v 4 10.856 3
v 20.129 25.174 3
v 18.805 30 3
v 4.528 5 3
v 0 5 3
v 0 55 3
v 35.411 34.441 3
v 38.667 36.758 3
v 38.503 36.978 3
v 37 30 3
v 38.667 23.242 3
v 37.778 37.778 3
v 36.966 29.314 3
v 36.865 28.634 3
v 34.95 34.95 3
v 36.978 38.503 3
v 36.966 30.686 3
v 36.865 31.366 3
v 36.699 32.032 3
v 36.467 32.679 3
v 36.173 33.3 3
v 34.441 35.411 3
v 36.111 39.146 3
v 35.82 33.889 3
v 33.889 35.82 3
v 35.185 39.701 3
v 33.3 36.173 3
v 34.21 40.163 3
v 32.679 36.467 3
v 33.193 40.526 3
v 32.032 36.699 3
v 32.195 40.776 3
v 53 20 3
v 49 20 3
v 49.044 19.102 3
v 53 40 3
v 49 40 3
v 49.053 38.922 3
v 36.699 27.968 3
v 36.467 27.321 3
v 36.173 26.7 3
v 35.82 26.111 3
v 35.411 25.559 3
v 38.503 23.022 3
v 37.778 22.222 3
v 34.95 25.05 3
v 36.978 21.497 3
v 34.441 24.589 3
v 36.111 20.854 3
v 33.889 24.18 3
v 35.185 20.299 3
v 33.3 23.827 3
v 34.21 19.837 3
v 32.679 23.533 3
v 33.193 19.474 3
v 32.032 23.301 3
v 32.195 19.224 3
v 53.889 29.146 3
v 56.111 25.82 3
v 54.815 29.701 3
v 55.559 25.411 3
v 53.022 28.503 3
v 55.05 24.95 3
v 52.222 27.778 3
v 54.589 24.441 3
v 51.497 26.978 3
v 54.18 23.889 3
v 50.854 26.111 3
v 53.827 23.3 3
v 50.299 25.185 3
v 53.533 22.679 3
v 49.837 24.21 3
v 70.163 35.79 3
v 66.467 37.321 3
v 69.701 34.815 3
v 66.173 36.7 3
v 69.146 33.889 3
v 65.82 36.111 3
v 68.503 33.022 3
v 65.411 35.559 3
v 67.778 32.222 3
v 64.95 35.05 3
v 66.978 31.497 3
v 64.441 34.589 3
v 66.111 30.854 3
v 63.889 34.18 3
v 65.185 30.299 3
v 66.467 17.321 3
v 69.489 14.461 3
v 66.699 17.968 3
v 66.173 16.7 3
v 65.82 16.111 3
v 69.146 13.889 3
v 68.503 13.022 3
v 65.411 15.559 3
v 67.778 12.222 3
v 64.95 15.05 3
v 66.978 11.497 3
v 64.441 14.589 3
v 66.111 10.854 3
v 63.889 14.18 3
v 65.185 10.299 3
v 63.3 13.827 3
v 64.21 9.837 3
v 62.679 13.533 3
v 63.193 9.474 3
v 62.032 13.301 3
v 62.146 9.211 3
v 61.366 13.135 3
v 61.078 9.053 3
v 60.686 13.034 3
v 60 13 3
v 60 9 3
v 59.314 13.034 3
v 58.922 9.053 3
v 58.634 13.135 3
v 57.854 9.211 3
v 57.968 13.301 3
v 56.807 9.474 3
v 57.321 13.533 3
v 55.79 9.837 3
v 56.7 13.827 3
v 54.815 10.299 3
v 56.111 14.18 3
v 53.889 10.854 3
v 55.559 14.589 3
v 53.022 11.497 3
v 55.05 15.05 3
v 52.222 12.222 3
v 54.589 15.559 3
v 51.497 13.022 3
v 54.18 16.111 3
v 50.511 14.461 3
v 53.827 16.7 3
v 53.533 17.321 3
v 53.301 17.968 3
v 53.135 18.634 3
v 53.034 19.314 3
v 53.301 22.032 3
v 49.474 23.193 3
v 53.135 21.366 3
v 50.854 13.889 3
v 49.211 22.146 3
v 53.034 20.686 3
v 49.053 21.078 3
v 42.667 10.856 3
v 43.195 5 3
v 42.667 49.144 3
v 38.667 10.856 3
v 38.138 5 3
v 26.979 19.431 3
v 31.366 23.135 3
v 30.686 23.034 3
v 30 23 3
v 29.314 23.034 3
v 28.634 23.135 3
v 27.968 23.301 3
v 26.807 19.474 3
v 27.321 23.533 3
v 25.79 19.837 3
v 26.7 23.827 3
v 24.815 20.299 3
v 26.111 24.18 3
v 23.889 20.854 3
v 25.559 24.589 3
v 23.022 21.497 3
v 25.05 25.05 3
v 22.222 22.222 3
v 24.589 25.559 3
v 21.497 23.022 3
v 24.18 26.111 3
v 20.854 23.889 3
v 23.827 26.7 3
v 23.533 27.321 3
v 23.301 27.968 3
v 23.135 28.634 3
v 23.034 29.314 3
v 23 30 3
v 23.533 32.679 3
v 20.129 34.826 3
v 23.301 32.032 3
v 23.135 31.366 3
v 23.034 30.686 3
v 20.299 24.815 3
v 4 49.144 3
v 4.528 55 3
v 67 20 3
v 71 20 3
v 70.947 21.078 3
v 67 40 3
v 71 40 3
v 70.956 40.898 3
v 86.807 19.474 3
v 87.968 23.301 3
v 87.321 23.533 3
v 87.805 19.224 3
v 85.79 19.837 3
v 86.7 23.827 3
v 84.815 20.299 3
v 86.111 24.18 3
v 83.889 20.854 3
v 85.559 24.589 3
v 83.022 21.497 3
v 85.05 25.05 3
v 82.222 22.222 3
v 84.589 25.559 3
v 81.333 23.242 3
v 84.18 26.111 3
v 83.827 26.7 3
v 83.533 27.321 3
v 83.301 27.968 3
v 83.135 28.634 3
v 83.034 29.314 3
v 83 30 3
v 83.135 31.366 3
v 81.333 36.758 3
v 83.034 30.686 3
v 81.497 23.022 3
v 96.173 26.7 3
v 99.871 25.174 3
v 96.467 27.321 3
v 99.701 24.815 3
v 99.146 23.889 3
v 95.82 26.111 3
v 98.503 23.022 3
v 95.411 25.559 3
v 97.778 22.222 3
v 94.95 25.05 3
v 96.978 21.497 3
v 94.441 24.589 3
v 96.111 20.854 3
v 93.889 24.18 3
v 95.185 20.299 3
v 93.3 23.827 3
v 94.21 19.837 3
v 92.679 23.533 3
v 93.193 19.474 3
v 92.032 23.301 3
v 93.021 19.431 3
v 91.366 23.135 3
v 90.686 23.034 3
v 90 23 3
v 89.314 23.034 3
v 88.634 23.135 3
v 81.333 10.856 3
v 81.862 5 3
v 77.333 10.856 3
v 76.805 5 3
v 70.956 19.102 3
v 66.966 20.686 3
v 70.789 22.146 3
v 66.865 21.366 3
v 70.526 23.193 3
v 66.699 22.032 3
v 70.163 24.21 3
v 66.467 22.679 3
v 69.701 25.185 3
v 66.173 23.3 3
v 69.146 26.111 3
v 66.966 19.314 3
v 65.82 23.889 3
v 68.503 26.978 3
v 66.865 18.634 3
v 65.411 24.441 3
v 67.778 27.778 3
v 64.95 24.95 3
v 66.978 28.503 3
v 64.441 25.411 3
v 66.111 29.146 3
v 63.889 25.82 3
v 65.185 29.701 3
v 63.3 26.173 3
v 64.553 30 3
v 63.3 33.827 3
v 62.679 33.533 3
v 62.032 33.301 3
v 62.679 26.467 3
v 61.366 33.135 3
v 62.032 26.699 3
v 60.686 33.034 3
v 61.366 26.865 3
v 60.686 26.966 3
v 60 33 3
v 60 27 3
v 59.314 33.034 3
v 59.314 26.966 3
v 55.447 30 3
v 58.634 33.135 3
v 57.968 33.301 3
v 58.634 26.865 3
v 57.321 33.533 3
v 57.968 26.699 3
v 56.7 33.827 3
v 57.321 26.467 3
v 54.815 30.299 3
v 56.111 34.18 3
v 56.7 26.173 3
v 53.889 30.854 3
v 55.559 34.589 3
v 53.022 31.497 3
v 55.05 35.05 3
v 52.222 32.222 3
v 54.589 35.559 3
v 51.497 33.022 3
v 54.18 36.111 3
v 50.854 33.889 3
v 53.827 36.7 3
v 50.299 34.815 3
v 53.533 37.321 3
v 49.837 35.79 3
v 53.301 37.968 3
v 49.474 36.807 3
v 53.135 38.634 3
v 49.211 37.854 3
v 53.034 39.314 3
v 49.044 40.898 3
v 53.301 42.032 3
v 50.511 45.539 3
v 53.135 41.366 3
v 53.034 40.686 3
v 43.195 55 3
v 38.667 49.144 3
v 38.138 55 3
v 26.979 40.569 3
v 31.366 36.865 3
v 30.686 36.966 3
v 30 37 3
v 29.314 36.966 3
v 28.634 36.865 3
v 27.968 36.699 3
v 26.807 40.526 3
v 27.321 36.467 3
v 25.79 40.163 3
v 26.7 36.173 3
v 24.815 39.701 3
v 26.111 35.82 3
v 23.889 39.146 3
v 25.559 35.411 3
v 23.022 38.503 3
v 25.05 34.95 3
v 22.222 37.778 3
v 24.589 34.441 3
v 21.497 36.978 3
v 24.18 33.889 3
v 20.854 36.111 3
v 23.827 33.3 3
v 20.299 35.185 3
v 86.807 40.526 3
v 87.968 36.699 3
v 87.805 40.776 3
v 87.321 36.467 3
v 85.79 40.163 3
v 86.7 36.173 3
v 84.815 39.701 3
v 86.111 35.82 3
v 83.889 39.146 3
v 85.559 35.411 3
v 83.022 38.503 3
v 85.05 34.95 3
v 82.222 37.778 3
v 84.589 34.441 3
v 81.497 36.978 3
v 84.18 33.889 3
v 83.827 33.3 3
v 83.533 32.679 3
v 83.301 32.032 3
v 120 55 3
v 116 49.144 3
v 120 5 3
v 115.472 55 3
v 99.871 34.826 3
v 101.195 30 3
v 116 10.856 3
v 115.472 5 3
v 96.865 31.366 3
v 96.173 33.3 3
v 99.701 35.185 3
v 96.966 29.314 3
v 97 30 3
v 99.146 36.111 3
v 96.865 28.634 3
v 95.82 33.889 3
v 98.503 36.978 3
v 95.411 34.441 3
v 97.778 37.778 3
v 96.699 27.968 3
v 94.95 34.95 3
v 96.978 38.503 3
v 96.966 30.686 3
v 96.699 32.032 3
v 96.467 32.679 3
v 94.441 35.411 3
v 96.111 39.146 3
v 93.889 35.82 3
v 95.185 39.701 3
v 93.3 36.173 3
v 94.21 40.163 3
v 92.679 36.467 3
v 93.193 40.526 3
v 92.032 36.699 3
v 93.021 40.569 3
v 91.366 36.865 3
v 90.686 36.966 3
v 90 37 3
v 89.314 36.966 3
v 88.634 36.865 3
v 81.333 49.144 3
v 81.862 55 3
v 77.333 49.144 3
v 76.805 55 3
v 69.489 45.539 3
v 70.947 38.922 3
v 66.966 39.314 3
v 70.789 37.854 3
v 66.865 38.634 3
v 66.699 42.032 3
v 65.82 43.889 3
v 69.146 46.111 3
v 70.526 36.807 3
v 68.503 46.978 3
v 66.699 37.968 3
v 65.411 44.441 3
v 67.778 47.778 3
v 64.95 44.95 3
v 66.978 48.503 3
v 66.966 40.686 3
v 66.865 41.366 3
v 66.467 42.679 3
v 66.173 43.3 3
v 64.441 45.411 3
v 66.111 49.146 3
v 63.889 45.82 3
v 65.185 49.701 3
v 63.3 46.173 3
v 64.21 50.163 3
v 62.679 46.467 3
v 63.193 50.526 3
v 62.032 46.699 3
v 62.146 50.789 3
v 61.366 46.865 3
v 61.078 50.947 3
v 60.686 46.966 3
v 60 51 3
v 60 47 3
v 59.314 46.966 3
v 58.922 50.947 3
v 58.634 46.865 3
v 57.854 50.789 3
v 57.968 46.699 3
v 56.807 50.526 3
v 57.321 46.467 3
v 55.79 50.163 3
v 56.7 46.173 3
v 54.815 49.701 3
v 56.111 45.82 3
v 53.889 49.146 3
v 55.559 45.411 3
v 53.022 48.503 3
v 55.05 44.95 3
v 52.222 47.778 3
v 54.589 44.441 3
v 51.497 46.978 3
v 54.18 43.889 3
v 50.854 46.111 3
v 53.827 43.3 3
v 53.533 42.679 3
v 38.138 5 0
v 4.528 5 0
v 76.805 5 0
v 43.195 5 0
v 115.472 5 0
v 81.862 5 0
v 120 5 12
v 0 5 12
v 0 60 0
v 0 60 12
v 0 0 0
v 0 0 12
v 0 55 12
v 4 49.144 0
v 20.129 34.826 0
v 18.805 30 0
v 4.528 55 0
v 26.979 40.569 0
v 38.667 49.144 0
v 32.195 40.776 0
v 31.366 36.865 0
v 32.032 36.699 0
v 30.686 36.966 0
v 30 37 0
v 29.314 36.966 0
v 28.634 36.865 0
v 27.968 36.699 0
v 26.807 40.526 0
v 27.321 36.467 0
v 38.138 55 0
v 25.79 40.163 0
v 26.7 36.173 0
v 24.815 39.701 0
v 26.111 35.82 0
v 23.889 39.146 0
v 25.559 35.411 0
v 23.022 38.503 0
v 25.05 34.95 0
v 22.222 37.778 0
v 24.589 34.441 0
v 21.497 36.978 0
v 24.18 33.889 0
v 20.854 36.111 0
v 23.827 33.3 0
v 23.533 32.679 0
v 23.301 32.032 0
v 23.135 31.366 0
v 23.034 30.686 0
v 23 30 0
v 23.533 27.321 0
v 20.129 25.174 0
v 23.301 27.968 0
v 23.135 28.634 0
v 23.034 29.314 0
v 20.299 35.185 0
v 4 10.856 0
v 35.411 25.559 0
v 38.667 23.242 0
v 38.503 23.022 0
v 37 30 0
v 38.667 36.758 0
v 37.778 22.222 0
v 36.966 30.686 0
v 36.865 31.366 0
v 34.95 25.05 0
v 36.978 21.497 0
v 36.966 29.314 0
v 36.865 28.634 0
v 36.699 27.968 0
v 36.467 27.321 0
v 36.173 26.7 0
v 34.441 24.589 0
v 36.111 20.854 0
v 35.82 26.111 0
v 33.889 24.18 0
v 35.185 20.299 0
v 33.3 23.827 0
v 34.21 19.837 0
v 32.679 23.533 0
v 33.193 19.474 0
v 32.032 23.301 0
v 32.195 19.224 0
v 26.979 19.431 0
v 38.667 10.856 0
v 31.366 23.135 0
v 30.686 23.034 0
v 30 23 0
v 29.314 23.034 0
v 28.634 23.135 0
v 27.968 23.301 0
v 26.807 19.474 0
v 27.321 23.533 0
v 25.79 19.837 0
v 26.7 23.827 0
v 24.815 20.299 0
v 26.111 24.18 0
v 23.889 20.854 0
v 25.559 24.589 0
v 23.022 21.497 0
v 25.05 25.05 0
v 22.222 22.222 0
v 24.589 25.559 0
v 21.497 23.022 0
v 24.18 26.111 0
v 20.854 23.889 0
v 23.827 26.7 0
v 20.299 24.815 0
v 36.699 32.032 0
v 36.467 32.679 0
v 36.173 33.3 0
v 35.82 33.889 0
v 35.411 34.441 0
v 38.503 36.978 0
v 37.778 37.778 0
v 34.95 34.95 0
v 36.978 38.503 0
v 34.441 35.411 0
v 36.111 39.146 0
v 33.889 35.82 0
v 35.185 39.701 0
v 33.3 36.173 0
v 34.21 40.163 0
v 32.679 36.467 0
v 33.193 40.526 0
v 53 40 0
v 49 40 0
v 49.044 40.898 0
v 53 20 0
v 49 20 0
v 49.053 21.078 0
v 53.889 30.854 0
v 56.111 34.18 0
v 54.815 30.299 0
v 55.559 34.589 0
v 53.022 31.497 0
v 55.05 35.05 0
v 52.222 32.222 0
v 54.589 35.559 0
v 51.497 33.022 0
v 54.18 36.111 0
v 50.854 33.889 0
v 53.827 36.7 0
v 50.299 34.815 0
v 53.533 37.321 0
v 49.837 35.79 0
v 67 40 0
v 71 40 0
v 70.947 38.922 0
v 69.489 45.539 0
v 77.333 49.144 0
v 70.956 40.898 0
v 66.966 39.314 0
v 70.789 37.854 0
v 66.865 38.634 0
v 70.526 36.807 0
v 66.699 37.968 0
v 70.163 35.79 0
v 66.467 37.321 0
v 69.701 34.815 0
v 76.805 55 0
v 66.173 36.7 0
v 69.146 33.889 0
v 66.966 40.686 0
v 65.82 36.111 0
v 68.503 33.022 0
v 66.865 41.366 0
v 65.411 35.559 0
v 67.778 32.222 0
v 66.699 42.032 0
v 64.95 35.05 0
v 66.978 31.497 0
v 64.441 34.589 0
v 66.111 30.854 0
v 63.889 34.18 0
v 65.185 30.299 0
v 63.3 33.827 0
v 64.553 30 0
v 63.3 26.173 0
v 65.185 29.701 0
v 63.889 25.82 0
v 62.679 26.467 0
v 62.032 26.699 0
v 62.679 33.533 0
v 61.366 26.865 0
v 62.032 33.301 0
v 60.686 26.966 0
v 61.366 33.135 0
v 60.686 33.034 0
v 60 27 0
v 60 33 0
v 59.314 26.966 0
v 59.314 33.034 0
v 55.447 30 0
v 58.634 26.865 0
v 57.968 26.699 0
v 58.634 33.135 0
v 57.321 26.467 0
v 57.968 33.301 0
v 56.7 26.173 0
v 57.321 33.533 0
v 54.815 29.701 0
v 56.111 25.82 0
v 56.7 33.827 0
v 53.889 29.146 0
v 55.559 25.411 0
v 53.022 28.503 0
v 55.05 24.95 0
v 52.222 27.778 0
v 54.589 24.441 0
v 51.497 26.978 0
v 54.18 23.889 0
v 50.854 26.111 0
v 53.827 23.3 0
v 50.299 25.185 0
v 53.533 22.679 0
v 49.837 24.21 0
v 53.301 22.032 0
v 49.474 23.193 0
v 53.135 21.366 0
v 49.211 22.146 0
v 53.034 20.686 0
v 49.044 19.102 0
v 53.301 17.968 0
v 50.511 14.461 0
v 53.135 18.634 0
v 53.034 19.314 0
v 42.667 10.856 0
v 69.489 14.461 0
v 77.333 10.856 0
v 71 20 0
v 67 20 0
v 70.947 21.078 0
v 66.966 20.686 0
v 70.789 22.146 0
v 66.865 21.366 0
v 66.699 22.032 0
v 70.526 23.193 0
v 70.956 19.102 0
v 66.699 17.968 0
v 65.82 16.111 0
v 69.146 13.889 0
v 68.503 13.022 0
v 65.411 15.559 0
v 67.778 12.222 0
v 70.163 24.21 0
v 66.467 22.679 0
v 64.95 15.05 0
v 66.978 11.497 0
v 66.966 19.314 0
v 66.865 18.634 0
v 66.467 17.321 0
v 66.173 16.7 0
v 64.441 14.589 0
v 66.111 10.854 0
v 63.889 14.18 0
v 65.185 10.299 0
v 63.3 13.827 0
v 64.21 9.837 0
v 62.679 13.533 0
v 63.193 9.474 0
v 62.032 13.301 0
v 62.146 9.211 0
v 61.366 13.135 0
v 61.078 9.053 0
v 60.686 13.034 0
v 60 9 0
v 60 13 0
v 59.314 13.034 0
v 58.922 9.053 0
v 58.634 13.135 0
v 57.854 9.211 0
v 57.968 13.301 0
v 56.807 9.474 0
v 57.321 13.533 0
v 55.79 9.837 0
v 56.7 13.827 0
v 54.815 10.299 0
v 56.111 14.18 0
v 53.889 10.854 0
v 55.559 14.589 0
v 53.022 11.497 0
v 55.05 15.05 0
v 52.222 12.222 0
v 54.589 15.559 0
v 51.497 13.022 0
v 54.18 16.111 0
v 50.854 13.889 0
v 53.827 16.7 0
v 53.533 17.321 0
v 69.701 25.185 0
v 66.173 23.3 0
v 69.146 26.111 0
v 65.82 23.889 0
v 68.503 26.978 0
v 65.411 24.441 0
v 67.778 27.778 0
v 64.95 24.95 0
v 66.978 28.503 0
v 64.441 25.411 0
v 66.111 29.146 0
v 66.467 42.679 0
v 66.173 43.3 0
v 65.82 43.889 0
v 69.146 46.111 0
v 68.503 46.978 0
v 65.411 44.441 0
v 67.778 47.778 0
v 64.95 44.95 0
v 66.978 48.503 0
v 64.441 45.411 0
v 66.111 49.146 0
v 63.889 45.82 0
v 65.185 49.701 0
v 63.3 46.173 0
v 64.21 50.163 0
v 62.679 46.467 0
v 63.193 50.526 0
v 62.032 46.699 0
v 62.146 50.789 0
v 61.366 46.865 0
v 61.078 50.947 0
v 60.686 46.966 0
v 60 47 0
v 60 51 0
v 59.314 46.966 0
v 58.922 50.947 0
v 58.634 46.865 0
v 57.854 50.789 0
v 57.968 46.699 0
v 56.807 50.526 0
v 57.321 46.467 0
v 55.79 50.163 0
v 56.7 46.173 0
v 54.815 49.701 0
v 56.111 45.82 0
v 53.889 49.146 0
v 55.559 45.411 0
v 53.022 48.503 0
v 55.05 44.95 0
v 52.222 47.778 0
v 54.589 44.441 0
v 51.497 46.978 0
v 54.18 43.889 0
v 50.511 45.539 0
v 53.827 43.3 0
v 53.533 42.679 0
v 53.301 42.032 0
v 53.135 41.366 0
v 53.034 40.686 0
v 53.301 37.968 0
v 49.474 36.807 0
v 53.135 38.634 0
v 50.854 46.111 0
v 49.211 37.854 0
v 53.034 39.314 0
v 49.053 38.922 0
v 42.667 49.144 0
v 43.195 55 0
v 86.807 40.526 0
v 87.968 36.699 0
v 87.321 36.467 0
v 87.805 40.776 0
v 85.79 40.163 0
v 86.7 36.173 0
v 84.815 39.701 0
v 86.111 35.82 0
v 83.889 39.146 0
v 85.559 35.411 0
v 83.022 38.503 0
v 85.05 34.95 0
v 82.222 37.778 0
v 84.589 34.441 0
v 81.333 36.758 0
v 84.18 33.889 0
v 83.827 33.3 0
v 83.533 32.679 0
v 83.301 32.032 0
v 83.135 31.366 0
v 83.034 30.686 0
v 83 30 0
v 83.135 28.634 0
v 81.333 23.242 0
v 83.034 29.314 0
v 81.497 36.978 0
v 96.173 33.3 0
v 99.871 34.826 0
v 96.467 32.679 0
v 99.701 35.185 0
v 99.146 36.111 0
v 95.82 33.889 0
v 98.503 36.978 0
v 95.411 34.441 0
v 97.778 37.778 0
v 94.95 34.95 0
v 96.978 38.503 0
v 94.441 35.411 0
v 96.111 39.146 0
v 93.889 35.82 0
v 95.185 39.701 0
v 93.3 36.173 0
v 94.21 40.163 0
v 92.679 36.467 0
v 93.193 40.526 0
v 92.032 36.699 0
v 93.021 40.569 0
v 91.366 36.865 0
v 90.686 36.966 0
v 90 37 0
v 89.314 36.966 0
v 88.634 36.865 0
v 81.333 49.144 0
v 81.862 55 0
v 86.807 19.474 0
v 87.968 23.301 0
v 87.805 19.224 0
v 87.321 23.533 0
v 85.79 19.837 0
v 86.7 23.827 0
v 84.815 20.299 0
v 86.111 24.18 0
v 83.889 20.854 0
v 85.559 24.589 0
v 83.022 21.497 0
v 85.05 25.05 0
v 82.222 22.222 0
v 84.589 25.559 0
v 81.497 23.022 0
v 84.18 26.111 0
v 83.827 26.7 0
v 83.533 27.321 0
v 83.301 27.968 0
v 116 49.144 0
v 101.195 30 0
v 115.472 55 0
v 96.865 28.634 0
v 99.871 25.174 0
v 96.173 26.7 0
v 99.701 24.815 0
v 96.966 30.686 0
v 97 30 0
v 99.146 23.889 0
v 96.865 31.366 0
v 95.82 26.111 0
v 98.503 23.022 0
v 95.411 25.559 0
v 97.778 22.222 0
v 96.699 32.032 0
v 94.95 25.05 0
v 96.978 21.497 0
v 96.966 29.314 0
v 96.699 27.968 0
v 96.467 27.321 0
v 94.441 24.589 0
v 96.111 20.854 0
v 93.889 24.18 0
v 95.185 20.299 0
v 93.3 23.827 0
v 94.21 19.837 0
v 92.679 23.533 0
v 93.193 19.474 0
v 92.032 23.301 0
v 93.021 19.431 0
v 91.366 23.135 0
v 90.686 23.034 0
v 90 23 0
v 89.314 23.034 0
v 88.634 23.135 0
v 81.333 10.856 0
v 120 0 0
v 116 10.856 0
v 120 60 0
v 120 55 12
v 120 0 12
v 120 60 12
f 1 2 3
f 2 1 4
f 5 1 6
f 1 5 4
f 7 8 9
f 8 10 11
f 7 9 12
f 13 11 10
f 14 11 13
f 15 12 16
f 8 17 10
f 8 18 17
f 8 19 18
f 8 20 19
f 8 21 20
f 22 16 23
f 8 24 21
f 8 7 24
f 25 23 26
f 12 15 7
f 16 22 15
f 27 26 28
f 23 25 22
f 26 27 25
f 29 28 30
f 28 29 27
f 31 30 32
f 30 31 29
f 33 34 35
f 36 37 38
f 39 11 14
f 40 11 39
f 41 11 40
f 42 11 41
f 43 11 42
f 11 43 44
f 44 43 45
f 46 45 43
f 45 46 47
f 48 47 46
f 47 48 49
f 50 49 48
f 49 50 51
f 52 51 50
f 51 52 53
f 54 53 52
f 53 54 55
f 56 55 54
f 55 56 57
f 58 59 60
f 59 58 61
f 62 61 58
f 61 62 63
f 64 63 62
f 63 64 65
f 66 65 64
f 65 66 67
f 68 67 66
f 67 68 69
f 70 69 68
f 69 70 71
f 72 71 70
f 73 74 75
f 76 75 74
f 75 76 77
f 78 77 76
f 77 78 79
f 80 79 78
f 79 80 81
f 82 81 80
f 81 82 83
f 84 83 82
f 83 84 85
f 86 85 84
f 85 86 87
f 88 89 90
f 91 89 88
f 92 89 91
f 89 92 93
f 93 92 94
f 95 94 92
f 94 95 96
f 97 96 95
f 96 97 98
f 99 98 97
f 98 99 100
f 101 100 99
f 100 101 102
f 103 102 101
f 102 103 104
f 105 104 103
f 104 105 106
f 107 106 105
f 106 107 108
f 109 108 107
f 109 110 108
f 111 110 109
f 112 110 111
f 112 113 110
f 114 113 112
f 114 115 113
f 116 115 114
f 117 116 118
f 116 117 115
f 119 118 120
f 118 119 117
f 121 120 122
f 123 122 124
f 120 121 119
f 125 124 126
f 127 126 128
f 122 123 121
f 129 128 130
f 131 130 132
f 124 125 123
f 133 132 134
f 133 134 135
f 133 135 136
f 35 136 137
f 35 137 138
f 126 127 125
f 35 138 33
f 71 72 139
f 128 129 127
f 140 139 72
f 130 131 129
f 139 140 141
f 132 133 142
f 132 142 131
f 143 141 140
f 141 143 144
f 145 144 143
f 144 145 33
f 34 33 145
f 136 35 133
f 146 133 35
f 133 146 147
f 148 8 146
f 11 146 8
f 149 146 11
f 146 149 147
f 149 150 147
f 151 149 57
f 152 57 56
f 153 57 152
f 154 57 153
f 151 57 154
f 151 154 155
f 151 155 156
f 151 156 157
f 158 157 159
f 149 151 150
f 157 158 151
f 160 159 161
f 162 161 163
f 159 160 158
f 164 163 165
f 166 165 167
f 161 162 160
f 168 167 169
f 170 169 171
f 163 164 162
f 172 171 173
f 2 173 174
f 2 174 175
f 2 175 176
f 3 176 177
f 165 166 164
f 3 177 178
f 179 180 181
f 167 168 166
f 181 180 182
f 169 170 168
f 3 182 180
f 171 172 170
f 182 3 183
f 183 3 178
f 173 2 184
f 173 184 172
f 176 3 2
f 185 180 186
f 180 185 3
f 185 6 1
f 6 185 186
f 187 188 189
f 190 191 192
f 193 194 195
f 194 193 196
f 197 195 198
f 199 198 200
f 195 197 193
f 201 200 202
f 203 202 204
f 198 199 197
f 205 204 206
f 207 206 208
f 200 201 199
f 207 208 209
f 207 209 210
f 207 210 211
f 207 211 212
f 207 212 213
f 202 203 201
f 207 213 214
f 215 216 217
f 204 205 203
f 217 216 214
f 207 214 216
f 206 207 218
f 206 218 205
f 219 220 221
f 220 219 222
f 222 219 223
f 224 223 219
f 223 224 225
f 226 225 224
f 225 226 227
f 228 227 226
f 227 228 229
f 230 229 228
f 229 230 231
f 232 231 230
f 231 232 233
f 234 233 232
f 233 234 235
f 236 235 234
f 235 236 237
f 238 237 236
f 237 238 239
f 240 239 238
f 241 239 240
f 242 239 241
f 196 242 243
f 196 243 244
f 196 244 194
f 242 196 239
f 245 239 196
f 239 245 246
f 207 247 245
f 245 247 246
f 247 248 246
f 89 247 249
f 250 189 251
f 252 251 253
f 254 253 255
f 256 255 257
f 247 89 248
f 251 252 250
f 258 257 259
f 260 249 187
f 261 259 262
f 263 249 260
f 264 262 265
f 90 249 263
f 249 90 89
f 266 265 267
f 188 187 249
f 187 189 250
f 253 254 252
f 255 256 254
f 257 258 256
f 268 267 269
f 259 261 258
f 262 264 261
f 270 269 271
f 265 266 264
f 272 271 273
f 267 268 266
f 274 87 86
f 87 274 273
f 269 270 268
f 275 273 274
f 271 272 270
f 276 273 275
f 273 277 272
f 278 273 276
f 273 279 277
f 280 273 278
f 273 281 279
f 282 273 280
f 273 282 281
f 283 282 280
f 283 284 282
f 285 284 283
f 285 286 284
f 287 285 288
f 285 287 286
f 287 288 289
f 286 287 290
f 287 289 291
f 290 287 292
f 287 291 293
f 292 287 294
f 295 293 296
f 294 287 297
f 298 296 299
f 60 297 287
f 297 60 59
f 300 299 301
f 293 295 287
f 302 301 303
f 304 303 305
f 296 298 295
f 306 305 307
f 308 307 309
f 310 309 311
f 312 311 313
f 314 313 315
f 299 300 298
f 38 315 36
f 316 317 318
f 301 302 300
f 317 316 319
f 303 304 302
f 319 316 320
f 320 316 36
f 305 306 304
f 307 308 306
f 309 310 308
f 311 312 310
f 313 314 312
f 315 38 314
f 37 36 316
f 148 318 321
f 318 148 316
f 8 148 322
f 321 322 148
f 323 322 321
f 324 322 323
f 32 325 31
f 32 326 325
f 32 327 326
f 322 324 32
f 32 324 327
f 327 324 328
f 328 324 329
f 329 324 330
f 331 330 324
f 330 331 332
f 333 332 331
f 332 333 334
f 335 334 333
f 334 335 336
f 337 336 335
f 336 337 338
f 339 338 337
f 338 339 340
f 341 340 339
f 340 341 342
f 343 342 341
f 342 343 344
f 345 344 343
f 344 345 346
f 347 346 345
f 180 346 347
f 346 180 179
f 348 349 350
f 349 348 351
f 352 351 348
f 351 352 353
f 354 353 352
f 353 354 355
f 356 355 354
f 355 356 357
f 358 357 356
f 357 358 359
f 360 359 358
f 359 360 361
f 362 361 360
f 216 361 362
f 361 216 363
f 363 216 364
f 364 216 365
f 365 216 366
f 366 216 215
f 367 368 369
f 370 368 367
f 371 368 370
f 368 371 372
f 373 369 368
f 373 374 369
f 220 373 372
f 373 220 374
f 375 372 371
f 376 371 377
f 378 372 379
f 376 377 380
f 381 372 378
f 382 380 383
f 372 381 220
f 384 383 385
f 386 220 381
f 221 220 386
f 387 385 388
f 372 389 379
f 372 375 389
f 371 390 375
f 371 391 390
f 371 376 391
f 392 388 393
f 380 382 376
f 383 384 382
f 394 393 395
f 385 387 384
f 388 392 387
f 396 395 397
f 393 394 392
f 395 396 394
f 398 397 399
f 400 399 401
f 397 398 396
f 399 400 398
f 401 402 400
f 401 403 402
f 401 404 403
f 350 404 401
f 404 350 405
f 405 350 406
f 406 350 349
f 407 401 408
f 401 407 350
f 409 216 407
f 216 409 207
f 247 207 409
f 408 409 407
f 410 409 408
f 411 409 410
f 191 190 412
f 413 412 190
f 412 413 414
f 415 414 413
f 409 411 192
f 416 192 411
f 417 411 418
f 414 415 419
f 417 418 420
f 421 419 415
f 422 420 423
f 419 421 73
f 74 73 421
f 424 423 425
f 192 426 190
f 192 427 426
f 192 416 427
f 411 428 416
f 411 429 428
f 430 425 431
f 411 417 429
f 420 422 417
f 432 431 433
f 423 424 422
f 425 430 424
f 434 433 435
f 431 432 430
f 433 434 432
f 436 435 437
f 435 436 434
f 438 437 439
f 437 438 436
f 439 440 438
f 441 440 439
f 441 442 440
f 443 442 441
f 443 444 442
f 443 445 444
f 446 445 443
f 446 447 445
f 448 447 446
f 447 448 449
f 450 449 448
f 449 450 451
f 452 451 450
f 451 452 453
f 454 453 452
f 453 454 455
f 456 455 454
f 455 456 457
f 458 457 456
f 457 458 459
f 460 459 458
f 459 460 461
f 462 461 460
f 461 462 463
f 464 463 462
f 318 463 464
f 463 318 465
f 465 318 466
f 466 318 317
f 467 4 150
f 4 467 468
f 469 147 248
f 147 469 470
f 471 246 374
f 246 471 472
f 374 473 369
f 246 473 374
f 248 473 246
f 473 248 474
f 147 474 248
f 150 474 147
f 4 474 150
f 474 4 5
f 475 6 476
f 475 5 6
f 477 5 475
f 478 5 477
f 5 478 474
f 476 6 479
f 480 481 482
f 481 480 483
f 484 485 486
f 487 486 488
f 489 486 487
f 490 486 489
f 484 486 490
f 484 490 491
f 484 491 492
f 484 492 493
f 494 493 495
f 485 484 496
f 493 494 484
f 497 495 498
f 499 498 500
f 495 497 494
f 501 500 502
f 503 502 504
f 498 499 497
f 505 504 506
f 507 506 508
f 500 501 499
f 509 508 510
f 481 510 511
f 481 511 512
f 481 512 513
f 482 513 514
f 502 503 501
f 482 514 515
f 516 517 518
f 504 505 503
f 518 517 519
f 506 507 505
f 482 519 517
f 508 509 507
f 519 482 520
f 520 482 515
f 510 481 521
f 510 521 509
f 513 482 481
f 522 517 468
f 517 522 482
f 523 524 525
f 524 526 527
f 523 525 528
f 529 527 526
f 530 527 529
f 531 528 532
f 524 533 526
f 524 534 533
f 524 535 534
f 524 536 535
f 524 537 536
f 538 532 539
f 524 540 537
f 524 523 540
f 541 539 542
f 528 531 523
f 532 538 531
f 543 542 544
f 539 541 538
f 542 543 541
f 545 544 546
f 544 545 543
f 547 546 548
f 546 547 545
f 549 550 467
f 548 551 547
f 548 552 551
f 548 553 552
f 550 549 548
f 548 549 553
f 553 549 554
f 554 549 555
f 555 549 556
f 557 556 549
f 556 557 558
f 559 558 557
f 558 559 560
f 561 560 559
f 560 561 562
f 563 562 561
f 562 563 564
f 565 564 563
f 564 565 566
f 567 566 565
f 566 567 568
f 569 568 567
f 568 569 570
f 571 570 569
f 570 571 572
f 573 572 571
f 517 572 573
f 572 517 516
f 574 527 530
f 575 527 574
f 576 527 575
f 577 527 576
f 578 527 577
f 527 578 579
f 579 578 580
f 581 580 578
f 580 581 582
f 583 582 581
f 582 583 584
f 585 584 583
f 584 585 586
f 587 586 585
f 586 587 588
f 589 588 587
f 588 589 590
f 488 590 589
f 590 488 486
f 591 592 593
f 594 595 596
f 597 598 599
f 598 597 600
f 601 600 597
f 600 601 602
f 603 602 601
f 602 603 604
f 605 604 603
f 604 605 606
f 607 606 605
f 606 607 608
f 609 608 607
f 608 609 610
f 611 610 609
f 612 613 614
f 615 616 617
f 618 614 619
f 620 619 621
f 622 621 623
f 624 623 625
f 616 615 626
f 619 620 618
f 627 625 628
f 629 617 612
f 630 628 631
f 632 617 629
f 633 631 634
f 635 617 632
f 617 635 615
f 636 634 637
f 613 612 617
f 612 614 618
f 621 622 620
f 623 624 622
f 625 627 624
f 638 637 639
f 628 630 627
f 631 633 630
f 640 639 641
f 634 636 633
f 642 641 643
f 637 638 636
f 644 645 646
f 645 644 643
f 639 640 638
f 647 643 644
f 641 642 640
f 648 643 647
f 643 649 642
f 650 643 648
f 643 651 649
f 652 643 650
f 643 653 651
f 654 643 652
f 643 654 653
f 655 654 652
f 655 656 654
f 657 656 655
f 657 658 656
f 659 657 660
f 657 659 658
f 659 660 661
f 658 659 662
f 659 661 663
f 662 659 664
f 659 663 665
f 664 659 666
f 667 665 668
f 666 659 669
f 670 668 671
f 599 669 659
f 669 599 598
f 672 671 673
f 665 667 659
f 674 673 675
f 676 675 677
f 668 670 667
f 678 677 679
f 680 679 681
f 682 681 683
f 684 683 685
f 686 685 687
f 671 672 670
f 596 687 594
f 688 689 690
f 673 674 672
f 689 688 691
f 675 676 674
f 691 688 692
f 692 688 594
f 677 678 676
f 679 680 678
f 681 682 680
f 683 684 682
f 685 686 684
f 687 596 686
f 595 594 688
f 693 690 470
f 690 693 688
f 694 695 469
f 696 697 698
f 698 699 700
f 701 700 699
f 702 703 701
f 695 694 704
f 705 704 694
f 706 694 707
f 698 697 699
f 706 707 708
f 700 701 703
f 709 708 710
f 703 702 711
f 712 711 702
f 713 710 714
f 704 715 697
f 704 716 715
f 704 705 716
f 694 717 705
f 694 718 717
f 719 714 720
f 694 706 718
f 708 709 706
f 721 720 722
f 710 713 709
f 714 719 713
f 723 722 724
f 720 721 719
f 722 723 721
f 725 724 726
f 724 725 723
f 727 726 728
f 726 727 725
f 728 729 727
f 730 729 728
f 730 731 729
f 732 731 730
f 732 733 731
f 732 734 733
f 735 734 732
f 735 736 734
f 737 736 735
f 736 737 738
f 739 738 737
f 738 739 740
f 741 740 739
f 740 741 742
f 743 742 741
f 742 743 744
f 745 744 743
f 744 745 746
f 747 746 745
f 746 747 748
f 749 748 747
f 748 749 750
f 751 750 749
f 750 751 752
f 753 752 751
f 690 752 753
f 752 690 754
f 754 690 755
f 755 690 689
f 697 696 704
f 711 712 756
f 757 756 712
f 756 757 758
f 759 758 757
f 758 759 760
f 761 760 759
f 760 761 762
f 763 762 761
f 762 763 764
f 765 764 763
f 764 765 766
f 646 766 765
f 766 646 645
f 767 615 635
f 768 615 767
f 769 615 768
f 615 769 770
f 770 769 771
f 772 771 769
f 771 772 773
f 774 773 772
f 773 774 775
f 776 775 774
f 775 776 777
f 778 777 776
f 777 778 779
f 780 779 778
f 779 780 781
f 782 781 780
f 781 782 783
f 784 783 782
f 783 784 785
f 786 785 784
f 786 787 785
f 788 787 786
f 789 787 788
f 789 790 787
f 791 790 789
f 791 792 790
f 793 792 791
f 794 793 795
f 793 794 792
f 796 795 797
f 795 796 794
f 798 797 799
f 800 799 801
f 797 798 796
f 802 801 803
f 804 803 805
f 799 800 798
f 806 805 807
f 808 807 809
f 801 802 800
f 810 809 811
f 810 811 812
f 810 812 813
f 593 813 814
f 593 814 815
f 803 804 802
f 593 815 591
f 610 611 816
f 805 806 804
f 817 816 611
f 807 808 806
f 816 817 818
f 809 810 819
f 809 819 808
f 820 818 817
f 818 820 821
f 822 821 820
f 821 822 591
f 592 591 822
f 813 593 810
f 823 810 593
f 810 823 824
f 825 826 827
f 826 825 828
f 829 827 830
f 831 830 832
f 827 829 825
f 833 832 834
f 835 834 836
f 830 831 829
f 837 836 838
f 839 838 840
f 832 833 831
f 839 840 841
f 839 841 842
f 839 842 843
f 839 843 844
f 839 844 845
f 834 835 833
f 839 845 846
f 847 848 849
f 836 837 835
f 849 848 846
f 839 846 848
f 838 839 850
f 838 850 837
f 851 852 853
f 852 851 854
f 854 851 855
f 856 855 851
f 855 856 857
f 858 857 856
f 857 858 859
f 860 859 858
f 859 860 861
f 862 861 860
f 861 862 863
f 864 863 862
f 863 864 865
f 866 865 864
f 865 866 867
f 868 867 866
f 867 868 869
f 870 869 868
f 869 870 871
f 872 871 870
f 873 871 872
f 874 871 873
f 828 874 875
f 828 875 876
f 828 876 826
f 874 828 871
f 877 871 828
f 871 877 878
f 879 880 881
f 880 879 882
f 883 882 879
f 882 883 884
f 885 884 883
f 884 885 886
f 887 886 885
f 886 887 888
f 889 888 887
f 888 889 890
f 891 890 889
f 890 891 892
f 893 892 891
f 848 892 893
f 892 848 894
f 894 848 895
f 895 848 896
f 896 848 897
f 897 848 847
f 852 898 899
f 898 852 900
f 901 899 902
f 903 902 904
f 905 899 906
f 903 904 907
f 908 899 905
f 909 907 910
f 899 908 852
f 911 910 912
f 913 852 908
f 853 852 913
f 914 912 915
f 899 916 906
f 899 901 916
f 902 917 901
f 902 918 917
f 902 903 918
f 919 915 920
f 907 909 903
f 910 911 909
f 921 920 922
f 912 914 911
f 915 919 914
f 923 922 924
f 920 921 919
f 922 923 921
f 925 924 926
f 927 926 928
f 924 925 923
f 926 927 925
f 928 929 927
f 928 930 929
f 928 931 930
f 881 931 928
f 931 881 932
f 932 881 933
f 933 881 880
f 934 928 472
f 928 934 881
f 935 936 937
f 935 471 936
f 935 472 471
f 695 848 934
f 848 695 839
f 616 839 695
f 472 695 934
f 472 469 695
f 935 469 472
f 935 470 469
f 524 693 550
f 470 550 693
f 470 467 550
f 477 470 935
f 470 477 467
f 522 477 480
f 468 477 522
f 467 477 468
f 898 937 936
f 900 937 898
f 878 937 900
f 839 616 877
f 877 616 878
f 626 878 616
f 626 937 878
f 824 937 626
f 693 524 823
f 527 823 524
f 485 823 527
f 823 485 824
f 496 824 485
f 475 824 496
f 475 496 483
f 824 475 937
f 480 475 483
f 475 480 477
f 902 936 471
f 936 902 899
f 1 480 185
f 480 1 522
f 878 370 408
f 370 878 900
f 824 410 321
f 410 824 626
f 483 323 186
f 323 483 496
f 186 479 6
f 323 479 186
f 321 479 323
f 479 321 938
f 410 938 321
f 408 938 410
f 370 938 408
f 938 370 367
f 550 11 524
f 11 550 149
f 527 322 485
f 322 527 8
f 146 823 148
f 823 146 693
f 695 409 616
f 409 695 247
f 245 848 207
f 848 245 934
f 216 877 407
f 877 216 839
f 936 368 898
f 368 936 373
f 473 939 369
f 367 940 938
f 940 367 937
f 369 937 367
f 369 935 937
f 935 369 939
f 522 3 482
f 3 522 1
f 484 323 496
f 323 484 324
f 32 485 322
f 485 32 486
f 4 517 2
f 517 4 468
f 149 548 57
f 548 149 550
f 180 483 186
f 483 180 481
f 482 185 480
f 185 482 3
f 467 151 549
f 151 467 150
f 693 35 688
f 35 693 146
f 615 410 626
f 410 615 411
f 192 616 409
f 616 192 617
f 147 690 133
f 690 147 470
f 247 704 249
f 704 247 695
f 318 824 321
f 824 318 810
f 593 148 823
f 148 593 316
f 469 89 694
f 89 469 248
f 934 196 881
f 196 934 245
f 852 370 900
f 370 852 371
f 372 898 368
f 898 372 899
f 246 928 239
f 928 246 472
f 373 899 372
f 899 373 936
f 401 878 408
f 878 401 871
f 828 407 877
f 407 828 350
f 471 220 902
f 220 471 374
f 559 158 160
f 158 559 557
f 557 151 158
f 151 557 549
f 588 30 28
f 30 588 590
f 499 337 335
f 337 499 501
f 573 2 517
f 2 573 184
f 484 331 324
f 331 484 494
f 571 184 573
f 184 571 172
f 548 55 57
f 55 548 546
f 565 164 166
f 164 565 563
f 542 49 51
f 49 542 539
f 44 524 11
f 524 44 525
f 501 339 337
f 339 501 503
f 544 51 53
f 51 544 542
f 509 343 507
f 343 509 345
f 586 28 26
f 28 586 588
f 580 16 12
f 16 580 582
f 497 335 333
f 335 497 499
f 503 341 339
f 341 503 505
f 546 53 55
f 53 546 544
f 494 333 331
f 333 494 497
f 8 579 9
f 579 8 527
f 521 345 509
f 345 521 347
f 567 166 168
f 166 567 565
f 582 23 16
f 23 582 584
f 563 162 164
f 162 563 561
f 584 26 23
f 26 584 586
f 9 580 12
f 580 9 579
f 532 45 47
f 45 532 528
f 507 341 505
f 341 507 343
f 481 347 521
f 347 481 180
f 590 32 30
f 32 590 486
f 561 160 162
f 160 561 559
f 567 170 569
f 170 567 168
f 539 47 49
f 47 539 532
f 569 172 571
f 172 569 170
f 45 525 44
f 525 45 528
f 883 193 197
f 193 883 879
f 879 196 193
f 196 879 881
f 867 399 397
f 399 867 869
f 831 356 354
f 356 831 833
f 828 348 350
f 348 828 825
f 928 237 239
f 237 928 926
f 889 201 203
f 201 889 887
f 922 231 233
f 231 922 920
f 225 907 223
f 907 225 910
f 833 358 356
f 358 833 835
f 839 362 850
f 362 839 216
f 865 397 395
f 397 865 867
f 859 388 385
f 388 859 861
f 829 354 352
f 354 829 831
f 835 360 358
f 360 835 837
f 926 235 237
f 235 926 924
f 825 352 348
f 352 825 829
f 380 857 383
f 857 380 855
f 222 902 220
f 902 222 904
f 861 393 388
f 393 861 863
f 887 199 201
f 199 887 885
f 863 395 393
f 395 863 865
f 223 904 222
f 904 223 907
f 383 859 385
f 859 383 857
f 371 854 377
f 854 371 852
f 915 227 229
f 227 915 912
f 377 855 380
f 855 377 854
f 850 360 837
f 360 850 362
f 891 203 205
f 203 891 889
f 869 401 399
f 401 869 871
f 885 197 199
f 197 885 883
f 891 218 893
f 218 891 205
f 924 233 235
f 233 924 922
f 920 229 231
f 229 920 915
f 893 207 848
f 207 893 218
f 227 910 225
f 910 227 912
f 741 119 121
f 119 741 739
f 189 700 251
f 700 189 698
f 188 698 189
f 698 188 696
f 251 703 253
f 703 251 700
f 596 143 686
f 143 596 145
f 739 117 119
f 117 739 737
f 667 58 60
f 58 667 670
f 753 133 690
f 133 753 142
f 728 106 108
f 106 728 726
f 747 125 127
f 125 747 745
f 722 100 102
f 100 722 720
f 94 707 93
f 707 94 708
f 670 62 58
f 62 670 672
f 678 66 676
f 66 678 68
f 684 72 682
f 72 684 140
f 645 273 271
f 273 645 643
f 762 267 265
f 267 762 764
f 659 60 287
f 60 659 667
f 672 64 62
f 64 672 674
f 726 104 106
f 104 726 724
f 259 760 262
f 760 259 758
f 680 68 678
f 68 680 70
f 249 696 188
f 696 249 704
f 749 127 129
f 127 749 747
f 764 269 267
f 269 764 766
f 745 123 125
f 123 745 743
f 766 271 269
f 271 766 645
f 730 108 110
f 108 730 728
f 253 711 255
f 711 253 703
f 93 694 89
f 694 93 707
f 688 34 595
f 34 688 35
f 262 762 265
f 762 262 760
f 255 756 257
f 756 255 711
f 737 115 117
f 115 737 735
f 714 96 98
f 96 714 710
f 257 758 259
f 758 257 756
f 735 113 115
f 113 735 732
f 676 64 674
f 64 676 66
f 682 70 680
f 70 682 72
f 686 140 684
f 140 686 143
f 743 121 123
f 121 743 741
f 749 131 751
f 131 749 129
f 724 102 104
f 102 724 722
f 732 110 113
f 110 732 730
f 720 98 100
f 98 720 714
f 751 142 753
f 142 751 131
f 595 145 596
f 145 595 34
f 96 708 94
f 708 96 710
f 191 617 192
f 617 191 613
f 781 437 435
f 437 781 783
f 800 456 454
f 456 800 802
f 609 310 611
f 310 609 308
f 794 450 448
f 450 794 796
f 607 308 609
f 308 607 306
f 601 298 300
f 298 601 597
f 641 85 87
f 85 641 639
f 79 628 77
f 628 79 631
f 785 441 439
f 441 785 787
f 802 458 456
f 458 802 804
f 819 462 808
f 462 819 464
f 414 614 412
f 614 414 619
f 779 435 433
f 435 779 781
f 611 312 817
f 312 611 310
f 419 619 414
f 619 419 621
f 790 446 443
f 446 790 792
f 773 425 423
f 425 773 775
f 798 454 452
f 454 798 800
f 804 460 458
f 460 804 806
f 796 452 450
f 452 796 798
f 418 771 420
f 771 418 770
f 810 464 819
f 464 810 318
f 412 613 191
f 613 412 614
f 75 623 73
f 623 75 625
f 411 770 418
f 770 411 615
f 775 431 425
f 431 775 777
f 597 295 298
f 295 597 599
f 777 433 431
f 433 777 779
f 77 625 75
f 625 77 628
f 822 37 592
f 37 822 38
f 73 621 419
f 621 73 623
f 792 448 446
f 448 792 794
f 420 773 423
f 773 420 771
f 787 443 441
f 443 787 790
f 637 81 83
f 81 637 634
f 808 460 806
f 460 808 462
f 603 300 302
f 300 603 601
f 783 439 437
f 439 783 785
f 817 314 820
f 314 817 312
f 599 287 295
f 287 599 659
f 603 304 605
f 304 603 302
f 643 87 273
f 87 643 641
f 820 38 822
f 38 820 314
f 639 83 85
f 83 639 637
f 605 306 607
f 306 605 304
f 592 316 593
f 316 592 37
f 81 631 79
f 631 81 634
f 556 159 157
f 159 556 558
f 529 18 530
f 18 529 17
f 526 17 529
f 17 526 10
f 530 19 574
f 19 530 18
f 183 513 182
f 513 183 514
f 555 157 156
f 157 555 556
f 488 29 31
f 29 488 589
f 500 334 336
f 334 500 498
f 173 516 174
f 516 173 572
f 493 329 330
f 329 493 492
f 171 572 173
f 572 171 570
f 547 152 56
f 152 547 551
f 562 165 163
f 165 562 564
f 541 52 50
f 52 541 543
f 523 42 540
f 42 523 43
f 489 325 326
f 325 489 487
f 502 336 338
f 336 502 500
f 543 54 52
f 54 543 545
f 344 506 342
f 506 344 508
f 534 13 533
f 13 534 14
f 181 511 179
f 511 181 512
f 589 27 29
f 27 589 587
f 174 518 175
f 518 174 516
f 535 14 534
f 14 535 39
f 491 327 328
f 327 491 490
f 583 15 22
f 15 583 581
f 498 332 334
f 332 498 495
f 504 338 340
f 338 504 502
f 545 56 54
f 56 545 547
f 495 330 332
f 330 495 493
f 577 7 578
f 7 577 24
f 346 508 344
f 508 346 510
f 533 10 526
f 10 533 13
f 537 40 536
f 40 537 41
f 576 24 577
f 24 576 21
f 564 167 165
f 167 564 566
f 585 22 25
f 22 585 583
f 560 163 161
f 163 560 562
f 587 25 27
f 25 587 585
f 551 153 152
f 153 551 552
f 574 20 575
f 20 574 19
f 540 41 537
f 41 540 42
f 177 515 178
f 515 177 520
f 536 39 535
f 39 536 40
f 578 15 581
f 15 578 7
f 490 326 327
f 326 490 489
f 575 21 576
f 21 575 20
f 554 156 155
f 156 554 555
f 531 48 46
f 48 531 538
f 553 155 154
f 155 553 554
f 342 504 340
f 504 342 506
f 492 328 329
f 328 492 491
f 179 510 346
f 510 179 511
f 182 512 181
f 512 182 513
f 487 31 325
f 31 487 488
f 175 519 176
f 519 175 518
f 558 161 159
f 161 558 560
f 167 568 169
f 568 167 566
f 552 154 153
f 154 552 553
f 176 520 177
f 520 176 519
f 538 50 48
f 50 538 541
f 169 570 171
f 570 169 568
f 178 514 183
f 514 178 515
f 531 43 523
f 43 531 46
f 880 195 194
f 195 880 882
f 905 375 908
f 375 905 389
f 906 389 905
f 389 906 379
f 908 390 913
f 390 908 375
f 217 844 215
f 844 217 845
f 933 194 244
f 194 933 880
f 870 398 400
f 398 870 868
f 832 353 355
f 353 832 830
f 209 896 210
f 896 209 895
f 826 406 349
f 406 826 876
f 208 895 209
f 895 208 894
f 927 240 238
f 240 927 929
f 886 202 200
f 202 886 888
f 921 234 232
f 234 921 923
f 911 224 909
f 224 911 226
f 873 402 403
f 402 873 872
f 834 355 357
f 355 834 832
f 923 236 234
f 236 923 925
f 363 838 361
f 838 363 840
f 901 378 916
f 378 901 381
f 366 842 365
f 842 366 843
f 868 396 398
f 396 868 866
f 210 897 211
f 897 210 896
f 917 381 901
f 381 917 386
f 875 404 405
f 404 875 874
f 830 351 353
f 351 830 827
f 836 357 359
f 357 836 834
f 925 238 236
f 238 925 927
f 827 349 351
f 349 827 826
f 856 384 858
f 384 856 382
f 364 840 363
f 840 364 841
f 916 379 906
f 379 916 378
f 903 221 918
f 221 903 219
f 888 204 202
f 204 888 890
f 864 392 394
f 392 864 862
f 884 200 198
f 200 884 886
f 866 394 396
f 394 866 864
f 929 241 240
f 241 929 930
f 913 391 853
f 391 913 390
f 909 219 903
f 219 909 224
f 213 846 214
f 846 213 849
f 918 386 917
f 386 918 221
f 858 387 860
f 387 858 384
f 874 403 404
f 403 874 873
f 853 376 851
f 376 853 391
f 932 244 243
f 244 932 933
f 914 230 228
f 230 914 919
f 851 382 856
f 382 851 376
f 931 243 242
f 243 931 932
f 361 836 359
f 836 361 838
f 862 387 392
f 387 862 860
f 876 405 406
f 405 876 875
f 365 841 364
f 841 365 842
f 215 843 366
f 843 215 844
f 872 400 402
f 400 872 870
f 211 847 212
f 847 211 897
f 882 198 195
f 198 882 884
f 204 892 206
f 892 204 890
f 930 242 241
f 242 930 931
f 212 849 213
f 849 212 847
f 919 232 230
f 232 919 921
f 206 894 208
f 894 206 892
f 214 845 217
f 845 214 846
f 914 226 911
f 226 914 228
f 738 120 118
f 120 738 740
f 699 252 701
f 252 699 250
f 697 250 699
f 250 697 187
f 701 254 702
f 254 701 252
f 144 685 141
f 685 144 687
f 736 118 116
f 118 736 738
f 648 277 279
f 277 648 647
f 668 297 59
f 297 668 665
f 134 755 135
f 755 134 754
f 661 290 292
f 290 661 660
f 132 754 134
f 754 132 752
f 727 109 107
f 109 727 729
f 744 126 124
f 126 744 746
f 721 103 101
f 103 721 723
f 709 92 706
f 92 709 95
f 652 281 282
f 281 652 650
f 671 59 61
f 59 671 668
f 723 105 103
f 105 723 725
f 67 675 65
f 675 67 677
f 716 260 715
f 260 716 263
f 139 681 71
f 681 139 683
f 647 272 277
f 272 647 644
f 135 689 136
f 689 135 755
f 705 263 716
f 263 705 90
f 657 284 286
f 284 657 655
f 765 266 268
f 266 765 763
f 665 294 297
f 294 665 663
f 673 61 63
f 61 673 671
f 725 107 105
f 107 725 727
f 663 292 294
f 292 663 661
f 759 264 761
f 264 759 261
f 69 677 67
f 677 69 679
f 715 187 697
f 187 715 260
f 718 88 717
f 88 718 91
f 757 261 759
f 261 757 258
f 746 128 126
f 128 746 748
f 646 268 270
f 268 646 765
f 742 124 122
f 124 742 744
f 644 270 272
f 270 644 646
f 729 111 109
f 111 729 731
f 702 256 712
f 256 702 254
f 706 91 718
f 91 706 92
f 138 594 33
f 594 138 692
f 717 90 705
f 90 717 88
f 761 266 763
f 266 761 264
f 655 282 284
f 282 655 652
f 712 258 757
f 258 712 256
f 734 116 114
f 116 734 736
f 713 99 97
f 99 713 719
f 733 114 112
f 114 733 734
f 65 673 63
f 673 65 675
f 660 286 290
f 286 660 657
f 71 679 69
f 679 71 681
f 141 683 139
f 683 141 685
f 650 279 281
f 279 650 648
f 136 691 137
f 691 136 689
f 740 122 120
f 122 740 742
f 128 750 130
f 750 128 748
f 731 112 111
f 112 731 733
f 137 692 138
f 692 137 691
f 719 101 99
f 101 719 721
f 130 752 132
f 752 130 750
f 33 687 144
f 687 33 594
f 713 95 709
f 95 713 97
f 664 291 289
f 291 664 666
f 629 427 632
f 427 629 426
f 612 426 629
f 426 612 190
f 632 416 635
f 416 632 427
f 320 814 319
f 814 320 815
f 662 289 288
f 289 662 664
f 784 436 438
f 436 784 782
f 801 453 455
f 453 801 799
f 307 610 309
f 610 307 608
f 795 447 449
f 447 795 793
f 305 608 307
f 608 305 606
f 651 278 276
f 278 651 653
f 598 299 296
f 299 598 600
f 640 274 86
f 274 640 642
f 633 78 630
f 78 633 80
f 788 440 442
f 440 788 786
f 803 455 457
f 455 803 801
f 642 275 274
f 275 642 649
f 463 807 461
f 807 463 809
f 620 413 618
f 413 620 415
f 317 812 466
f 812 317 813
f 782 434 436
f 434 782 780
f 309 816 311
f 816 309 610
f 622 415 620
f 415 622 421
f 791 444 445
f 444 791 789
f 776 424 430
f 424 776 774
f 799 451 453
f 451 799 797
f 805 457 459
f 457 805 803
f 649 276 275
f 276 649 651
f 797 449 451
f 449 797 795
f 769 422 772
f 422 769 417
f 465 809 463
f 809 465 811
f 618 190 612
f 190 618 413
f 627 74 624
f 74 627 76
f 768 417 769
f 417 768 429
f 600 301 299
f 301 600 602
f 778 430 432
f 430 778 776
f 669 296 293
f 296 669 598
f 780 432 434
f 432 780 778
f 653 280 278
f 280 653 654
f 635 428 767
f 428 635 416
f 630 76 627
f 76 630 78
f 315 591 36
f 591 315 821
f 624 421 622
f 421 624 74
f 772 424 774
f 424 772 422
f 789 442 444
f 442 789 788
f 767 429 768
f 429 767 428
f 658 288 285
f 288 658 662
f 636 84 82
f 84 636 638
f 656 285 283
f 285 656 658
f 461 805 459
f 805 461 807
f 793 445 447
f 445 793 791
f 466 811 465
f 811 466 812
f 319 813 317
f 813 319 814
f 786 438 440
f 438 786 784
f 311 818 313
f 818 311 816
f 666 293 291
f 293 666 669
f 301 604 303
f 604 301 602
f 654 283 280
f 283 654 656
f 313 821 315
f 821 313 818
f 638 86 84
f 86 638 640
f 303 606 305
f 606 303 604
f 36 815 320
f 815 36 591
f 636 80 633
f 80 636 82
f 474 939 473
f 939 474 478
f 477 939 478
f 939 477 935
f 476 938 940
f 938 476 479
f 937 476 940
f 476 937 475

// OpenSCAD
// OpenSCAD Model: Low Rectangular Open Web with Tall Side Walls
// All dimensions in millimeters

// --------------------------
// Parametric Part Definitions
// --------------------------
part_length = 120;          // Total part length along long X axis
part_width = 60;            // Total part width along short Y axis

// Tall side wall parameters (along long edges, higher than web)
wall_thickness = 5;         // Y-direction thickness of long side walls
wall_height = 12;           // Z-height of walls from Z=0 base (taller than web)

// Open web parameters (shallow ribbed grid)
web_rib_thickness = 4;      // In-plane (XY) thickness of all web ribs
web_height = 3;             // Z-height of web ribs from Z=0 base (shallow)
n_transverse_ribs = 2;      // Number of internal cross ribs across the width

// Circular opening parameters (through voids with circular rib borders)
circular_hole_r = 7;        // Radius of inner circular voids
circular_hole_centers = [   // [X,Y] center positions for circular openings
    [30, part_width/2],
    [90, part_width/2],
    [60, 20],
    [60, 40]
];

// Global resolution for curved surfaces
$fn = 64;

// --------------------------
// Helper Modules
// --------------------------
module diagonal_rib(p1, p2, rib_thickness, rib_height) {
    // Create a straight rectangular rib between two XY points, rooted at Z=0
    dx = p2[0] - p1[0];
    dy = p2[1] - p1[1];
    rib_length = norm([dx, dy]);
    rib_angle = atan2(dy, dx);
    midpoint = [
        (p1[0] + p2[0]) / 2,
        (p1[1] + p2[1]) / 2,
        rib_height / 2
    ];
    translate(midpoint)
        rotate(rib_angle, [0, 0, 1])
            cube([rib_length, rib_thickness, rib_height], center=true);
}

// --------------------------
// Main Part Geometry
// --------------------------
union() {
    // Tall solid side walls along opposite long edges (added material, not cuts)
    cube([part_length, wall_thickness, wall_height]);  // Wall at Y=0 edge
    translate([0, part_width - wall_thickness, 0])
        cube([part_length, wall_thickness, wall_height]);  // Wall at Y=part_width edge

    // Shallow open web structure (rib grid with through openings)
    difference() {
        // Build all solid web rib material
        union() {
            // Calculate positions for all Y-oriented ribs (end perimeter + cross ribs)
            left_end_x = web_rib_thickness / 2;
            right_end_x = part_length - web_rib_thickness / 2;
            rib_spacing = (part_length - web_rib_thickness) / (n_transverse_ribs + 1);
            transverse_x = [for (i = [1:n_transverse_ribs]) left_end_x + i * rib_spacing];
            all_y_rib_x = concat([left_end_x], transverse_x, [right_end_x]);

            // Add Y-direction straight ribs
            for (x_pos = all_y_rib_x) {
                diagonal_rib(
                    [x_pos, wall_thickness],
                    [x_pos, part_width - wall_thickness],
                    web_rib_thickness,
                    web_height
                );
            }

            // Add X-brace diagonal ribs in each bay between transverse ribs
            for (i = [0:len(all_y_rib_x)-2]) {
                xl = all_y_rib_x[i];
                xr = all_y_rib_x[i+1];
                y_min = wall_thickness;
                y_max = part_width - wall_thickness;
                diagonal_rib([xl, y_min], [xr, y_max], web_rib_thickness, web_height);
                diagonal_rib([xl, y_max], [xr, y_min], web_rib_thickness, web_height);
            }

            // Add solid ring stock for circular opening borders
            for (hole = circular_hole_centers) {
                translate([hole[0], hole[1], 0])
                    cylinder(h=web_height, r=circular_hole_r + web_rib_thickness);
            }
        }

        // Cut clean through openings for circular voids (removes any rib material across holes)
        for (hole = circular_hole_centers) {
            translate([hole[0], hole[1], -1])
                cylinder(h=web_height + 2, r=circular_hole_r);
        }
    }
}
